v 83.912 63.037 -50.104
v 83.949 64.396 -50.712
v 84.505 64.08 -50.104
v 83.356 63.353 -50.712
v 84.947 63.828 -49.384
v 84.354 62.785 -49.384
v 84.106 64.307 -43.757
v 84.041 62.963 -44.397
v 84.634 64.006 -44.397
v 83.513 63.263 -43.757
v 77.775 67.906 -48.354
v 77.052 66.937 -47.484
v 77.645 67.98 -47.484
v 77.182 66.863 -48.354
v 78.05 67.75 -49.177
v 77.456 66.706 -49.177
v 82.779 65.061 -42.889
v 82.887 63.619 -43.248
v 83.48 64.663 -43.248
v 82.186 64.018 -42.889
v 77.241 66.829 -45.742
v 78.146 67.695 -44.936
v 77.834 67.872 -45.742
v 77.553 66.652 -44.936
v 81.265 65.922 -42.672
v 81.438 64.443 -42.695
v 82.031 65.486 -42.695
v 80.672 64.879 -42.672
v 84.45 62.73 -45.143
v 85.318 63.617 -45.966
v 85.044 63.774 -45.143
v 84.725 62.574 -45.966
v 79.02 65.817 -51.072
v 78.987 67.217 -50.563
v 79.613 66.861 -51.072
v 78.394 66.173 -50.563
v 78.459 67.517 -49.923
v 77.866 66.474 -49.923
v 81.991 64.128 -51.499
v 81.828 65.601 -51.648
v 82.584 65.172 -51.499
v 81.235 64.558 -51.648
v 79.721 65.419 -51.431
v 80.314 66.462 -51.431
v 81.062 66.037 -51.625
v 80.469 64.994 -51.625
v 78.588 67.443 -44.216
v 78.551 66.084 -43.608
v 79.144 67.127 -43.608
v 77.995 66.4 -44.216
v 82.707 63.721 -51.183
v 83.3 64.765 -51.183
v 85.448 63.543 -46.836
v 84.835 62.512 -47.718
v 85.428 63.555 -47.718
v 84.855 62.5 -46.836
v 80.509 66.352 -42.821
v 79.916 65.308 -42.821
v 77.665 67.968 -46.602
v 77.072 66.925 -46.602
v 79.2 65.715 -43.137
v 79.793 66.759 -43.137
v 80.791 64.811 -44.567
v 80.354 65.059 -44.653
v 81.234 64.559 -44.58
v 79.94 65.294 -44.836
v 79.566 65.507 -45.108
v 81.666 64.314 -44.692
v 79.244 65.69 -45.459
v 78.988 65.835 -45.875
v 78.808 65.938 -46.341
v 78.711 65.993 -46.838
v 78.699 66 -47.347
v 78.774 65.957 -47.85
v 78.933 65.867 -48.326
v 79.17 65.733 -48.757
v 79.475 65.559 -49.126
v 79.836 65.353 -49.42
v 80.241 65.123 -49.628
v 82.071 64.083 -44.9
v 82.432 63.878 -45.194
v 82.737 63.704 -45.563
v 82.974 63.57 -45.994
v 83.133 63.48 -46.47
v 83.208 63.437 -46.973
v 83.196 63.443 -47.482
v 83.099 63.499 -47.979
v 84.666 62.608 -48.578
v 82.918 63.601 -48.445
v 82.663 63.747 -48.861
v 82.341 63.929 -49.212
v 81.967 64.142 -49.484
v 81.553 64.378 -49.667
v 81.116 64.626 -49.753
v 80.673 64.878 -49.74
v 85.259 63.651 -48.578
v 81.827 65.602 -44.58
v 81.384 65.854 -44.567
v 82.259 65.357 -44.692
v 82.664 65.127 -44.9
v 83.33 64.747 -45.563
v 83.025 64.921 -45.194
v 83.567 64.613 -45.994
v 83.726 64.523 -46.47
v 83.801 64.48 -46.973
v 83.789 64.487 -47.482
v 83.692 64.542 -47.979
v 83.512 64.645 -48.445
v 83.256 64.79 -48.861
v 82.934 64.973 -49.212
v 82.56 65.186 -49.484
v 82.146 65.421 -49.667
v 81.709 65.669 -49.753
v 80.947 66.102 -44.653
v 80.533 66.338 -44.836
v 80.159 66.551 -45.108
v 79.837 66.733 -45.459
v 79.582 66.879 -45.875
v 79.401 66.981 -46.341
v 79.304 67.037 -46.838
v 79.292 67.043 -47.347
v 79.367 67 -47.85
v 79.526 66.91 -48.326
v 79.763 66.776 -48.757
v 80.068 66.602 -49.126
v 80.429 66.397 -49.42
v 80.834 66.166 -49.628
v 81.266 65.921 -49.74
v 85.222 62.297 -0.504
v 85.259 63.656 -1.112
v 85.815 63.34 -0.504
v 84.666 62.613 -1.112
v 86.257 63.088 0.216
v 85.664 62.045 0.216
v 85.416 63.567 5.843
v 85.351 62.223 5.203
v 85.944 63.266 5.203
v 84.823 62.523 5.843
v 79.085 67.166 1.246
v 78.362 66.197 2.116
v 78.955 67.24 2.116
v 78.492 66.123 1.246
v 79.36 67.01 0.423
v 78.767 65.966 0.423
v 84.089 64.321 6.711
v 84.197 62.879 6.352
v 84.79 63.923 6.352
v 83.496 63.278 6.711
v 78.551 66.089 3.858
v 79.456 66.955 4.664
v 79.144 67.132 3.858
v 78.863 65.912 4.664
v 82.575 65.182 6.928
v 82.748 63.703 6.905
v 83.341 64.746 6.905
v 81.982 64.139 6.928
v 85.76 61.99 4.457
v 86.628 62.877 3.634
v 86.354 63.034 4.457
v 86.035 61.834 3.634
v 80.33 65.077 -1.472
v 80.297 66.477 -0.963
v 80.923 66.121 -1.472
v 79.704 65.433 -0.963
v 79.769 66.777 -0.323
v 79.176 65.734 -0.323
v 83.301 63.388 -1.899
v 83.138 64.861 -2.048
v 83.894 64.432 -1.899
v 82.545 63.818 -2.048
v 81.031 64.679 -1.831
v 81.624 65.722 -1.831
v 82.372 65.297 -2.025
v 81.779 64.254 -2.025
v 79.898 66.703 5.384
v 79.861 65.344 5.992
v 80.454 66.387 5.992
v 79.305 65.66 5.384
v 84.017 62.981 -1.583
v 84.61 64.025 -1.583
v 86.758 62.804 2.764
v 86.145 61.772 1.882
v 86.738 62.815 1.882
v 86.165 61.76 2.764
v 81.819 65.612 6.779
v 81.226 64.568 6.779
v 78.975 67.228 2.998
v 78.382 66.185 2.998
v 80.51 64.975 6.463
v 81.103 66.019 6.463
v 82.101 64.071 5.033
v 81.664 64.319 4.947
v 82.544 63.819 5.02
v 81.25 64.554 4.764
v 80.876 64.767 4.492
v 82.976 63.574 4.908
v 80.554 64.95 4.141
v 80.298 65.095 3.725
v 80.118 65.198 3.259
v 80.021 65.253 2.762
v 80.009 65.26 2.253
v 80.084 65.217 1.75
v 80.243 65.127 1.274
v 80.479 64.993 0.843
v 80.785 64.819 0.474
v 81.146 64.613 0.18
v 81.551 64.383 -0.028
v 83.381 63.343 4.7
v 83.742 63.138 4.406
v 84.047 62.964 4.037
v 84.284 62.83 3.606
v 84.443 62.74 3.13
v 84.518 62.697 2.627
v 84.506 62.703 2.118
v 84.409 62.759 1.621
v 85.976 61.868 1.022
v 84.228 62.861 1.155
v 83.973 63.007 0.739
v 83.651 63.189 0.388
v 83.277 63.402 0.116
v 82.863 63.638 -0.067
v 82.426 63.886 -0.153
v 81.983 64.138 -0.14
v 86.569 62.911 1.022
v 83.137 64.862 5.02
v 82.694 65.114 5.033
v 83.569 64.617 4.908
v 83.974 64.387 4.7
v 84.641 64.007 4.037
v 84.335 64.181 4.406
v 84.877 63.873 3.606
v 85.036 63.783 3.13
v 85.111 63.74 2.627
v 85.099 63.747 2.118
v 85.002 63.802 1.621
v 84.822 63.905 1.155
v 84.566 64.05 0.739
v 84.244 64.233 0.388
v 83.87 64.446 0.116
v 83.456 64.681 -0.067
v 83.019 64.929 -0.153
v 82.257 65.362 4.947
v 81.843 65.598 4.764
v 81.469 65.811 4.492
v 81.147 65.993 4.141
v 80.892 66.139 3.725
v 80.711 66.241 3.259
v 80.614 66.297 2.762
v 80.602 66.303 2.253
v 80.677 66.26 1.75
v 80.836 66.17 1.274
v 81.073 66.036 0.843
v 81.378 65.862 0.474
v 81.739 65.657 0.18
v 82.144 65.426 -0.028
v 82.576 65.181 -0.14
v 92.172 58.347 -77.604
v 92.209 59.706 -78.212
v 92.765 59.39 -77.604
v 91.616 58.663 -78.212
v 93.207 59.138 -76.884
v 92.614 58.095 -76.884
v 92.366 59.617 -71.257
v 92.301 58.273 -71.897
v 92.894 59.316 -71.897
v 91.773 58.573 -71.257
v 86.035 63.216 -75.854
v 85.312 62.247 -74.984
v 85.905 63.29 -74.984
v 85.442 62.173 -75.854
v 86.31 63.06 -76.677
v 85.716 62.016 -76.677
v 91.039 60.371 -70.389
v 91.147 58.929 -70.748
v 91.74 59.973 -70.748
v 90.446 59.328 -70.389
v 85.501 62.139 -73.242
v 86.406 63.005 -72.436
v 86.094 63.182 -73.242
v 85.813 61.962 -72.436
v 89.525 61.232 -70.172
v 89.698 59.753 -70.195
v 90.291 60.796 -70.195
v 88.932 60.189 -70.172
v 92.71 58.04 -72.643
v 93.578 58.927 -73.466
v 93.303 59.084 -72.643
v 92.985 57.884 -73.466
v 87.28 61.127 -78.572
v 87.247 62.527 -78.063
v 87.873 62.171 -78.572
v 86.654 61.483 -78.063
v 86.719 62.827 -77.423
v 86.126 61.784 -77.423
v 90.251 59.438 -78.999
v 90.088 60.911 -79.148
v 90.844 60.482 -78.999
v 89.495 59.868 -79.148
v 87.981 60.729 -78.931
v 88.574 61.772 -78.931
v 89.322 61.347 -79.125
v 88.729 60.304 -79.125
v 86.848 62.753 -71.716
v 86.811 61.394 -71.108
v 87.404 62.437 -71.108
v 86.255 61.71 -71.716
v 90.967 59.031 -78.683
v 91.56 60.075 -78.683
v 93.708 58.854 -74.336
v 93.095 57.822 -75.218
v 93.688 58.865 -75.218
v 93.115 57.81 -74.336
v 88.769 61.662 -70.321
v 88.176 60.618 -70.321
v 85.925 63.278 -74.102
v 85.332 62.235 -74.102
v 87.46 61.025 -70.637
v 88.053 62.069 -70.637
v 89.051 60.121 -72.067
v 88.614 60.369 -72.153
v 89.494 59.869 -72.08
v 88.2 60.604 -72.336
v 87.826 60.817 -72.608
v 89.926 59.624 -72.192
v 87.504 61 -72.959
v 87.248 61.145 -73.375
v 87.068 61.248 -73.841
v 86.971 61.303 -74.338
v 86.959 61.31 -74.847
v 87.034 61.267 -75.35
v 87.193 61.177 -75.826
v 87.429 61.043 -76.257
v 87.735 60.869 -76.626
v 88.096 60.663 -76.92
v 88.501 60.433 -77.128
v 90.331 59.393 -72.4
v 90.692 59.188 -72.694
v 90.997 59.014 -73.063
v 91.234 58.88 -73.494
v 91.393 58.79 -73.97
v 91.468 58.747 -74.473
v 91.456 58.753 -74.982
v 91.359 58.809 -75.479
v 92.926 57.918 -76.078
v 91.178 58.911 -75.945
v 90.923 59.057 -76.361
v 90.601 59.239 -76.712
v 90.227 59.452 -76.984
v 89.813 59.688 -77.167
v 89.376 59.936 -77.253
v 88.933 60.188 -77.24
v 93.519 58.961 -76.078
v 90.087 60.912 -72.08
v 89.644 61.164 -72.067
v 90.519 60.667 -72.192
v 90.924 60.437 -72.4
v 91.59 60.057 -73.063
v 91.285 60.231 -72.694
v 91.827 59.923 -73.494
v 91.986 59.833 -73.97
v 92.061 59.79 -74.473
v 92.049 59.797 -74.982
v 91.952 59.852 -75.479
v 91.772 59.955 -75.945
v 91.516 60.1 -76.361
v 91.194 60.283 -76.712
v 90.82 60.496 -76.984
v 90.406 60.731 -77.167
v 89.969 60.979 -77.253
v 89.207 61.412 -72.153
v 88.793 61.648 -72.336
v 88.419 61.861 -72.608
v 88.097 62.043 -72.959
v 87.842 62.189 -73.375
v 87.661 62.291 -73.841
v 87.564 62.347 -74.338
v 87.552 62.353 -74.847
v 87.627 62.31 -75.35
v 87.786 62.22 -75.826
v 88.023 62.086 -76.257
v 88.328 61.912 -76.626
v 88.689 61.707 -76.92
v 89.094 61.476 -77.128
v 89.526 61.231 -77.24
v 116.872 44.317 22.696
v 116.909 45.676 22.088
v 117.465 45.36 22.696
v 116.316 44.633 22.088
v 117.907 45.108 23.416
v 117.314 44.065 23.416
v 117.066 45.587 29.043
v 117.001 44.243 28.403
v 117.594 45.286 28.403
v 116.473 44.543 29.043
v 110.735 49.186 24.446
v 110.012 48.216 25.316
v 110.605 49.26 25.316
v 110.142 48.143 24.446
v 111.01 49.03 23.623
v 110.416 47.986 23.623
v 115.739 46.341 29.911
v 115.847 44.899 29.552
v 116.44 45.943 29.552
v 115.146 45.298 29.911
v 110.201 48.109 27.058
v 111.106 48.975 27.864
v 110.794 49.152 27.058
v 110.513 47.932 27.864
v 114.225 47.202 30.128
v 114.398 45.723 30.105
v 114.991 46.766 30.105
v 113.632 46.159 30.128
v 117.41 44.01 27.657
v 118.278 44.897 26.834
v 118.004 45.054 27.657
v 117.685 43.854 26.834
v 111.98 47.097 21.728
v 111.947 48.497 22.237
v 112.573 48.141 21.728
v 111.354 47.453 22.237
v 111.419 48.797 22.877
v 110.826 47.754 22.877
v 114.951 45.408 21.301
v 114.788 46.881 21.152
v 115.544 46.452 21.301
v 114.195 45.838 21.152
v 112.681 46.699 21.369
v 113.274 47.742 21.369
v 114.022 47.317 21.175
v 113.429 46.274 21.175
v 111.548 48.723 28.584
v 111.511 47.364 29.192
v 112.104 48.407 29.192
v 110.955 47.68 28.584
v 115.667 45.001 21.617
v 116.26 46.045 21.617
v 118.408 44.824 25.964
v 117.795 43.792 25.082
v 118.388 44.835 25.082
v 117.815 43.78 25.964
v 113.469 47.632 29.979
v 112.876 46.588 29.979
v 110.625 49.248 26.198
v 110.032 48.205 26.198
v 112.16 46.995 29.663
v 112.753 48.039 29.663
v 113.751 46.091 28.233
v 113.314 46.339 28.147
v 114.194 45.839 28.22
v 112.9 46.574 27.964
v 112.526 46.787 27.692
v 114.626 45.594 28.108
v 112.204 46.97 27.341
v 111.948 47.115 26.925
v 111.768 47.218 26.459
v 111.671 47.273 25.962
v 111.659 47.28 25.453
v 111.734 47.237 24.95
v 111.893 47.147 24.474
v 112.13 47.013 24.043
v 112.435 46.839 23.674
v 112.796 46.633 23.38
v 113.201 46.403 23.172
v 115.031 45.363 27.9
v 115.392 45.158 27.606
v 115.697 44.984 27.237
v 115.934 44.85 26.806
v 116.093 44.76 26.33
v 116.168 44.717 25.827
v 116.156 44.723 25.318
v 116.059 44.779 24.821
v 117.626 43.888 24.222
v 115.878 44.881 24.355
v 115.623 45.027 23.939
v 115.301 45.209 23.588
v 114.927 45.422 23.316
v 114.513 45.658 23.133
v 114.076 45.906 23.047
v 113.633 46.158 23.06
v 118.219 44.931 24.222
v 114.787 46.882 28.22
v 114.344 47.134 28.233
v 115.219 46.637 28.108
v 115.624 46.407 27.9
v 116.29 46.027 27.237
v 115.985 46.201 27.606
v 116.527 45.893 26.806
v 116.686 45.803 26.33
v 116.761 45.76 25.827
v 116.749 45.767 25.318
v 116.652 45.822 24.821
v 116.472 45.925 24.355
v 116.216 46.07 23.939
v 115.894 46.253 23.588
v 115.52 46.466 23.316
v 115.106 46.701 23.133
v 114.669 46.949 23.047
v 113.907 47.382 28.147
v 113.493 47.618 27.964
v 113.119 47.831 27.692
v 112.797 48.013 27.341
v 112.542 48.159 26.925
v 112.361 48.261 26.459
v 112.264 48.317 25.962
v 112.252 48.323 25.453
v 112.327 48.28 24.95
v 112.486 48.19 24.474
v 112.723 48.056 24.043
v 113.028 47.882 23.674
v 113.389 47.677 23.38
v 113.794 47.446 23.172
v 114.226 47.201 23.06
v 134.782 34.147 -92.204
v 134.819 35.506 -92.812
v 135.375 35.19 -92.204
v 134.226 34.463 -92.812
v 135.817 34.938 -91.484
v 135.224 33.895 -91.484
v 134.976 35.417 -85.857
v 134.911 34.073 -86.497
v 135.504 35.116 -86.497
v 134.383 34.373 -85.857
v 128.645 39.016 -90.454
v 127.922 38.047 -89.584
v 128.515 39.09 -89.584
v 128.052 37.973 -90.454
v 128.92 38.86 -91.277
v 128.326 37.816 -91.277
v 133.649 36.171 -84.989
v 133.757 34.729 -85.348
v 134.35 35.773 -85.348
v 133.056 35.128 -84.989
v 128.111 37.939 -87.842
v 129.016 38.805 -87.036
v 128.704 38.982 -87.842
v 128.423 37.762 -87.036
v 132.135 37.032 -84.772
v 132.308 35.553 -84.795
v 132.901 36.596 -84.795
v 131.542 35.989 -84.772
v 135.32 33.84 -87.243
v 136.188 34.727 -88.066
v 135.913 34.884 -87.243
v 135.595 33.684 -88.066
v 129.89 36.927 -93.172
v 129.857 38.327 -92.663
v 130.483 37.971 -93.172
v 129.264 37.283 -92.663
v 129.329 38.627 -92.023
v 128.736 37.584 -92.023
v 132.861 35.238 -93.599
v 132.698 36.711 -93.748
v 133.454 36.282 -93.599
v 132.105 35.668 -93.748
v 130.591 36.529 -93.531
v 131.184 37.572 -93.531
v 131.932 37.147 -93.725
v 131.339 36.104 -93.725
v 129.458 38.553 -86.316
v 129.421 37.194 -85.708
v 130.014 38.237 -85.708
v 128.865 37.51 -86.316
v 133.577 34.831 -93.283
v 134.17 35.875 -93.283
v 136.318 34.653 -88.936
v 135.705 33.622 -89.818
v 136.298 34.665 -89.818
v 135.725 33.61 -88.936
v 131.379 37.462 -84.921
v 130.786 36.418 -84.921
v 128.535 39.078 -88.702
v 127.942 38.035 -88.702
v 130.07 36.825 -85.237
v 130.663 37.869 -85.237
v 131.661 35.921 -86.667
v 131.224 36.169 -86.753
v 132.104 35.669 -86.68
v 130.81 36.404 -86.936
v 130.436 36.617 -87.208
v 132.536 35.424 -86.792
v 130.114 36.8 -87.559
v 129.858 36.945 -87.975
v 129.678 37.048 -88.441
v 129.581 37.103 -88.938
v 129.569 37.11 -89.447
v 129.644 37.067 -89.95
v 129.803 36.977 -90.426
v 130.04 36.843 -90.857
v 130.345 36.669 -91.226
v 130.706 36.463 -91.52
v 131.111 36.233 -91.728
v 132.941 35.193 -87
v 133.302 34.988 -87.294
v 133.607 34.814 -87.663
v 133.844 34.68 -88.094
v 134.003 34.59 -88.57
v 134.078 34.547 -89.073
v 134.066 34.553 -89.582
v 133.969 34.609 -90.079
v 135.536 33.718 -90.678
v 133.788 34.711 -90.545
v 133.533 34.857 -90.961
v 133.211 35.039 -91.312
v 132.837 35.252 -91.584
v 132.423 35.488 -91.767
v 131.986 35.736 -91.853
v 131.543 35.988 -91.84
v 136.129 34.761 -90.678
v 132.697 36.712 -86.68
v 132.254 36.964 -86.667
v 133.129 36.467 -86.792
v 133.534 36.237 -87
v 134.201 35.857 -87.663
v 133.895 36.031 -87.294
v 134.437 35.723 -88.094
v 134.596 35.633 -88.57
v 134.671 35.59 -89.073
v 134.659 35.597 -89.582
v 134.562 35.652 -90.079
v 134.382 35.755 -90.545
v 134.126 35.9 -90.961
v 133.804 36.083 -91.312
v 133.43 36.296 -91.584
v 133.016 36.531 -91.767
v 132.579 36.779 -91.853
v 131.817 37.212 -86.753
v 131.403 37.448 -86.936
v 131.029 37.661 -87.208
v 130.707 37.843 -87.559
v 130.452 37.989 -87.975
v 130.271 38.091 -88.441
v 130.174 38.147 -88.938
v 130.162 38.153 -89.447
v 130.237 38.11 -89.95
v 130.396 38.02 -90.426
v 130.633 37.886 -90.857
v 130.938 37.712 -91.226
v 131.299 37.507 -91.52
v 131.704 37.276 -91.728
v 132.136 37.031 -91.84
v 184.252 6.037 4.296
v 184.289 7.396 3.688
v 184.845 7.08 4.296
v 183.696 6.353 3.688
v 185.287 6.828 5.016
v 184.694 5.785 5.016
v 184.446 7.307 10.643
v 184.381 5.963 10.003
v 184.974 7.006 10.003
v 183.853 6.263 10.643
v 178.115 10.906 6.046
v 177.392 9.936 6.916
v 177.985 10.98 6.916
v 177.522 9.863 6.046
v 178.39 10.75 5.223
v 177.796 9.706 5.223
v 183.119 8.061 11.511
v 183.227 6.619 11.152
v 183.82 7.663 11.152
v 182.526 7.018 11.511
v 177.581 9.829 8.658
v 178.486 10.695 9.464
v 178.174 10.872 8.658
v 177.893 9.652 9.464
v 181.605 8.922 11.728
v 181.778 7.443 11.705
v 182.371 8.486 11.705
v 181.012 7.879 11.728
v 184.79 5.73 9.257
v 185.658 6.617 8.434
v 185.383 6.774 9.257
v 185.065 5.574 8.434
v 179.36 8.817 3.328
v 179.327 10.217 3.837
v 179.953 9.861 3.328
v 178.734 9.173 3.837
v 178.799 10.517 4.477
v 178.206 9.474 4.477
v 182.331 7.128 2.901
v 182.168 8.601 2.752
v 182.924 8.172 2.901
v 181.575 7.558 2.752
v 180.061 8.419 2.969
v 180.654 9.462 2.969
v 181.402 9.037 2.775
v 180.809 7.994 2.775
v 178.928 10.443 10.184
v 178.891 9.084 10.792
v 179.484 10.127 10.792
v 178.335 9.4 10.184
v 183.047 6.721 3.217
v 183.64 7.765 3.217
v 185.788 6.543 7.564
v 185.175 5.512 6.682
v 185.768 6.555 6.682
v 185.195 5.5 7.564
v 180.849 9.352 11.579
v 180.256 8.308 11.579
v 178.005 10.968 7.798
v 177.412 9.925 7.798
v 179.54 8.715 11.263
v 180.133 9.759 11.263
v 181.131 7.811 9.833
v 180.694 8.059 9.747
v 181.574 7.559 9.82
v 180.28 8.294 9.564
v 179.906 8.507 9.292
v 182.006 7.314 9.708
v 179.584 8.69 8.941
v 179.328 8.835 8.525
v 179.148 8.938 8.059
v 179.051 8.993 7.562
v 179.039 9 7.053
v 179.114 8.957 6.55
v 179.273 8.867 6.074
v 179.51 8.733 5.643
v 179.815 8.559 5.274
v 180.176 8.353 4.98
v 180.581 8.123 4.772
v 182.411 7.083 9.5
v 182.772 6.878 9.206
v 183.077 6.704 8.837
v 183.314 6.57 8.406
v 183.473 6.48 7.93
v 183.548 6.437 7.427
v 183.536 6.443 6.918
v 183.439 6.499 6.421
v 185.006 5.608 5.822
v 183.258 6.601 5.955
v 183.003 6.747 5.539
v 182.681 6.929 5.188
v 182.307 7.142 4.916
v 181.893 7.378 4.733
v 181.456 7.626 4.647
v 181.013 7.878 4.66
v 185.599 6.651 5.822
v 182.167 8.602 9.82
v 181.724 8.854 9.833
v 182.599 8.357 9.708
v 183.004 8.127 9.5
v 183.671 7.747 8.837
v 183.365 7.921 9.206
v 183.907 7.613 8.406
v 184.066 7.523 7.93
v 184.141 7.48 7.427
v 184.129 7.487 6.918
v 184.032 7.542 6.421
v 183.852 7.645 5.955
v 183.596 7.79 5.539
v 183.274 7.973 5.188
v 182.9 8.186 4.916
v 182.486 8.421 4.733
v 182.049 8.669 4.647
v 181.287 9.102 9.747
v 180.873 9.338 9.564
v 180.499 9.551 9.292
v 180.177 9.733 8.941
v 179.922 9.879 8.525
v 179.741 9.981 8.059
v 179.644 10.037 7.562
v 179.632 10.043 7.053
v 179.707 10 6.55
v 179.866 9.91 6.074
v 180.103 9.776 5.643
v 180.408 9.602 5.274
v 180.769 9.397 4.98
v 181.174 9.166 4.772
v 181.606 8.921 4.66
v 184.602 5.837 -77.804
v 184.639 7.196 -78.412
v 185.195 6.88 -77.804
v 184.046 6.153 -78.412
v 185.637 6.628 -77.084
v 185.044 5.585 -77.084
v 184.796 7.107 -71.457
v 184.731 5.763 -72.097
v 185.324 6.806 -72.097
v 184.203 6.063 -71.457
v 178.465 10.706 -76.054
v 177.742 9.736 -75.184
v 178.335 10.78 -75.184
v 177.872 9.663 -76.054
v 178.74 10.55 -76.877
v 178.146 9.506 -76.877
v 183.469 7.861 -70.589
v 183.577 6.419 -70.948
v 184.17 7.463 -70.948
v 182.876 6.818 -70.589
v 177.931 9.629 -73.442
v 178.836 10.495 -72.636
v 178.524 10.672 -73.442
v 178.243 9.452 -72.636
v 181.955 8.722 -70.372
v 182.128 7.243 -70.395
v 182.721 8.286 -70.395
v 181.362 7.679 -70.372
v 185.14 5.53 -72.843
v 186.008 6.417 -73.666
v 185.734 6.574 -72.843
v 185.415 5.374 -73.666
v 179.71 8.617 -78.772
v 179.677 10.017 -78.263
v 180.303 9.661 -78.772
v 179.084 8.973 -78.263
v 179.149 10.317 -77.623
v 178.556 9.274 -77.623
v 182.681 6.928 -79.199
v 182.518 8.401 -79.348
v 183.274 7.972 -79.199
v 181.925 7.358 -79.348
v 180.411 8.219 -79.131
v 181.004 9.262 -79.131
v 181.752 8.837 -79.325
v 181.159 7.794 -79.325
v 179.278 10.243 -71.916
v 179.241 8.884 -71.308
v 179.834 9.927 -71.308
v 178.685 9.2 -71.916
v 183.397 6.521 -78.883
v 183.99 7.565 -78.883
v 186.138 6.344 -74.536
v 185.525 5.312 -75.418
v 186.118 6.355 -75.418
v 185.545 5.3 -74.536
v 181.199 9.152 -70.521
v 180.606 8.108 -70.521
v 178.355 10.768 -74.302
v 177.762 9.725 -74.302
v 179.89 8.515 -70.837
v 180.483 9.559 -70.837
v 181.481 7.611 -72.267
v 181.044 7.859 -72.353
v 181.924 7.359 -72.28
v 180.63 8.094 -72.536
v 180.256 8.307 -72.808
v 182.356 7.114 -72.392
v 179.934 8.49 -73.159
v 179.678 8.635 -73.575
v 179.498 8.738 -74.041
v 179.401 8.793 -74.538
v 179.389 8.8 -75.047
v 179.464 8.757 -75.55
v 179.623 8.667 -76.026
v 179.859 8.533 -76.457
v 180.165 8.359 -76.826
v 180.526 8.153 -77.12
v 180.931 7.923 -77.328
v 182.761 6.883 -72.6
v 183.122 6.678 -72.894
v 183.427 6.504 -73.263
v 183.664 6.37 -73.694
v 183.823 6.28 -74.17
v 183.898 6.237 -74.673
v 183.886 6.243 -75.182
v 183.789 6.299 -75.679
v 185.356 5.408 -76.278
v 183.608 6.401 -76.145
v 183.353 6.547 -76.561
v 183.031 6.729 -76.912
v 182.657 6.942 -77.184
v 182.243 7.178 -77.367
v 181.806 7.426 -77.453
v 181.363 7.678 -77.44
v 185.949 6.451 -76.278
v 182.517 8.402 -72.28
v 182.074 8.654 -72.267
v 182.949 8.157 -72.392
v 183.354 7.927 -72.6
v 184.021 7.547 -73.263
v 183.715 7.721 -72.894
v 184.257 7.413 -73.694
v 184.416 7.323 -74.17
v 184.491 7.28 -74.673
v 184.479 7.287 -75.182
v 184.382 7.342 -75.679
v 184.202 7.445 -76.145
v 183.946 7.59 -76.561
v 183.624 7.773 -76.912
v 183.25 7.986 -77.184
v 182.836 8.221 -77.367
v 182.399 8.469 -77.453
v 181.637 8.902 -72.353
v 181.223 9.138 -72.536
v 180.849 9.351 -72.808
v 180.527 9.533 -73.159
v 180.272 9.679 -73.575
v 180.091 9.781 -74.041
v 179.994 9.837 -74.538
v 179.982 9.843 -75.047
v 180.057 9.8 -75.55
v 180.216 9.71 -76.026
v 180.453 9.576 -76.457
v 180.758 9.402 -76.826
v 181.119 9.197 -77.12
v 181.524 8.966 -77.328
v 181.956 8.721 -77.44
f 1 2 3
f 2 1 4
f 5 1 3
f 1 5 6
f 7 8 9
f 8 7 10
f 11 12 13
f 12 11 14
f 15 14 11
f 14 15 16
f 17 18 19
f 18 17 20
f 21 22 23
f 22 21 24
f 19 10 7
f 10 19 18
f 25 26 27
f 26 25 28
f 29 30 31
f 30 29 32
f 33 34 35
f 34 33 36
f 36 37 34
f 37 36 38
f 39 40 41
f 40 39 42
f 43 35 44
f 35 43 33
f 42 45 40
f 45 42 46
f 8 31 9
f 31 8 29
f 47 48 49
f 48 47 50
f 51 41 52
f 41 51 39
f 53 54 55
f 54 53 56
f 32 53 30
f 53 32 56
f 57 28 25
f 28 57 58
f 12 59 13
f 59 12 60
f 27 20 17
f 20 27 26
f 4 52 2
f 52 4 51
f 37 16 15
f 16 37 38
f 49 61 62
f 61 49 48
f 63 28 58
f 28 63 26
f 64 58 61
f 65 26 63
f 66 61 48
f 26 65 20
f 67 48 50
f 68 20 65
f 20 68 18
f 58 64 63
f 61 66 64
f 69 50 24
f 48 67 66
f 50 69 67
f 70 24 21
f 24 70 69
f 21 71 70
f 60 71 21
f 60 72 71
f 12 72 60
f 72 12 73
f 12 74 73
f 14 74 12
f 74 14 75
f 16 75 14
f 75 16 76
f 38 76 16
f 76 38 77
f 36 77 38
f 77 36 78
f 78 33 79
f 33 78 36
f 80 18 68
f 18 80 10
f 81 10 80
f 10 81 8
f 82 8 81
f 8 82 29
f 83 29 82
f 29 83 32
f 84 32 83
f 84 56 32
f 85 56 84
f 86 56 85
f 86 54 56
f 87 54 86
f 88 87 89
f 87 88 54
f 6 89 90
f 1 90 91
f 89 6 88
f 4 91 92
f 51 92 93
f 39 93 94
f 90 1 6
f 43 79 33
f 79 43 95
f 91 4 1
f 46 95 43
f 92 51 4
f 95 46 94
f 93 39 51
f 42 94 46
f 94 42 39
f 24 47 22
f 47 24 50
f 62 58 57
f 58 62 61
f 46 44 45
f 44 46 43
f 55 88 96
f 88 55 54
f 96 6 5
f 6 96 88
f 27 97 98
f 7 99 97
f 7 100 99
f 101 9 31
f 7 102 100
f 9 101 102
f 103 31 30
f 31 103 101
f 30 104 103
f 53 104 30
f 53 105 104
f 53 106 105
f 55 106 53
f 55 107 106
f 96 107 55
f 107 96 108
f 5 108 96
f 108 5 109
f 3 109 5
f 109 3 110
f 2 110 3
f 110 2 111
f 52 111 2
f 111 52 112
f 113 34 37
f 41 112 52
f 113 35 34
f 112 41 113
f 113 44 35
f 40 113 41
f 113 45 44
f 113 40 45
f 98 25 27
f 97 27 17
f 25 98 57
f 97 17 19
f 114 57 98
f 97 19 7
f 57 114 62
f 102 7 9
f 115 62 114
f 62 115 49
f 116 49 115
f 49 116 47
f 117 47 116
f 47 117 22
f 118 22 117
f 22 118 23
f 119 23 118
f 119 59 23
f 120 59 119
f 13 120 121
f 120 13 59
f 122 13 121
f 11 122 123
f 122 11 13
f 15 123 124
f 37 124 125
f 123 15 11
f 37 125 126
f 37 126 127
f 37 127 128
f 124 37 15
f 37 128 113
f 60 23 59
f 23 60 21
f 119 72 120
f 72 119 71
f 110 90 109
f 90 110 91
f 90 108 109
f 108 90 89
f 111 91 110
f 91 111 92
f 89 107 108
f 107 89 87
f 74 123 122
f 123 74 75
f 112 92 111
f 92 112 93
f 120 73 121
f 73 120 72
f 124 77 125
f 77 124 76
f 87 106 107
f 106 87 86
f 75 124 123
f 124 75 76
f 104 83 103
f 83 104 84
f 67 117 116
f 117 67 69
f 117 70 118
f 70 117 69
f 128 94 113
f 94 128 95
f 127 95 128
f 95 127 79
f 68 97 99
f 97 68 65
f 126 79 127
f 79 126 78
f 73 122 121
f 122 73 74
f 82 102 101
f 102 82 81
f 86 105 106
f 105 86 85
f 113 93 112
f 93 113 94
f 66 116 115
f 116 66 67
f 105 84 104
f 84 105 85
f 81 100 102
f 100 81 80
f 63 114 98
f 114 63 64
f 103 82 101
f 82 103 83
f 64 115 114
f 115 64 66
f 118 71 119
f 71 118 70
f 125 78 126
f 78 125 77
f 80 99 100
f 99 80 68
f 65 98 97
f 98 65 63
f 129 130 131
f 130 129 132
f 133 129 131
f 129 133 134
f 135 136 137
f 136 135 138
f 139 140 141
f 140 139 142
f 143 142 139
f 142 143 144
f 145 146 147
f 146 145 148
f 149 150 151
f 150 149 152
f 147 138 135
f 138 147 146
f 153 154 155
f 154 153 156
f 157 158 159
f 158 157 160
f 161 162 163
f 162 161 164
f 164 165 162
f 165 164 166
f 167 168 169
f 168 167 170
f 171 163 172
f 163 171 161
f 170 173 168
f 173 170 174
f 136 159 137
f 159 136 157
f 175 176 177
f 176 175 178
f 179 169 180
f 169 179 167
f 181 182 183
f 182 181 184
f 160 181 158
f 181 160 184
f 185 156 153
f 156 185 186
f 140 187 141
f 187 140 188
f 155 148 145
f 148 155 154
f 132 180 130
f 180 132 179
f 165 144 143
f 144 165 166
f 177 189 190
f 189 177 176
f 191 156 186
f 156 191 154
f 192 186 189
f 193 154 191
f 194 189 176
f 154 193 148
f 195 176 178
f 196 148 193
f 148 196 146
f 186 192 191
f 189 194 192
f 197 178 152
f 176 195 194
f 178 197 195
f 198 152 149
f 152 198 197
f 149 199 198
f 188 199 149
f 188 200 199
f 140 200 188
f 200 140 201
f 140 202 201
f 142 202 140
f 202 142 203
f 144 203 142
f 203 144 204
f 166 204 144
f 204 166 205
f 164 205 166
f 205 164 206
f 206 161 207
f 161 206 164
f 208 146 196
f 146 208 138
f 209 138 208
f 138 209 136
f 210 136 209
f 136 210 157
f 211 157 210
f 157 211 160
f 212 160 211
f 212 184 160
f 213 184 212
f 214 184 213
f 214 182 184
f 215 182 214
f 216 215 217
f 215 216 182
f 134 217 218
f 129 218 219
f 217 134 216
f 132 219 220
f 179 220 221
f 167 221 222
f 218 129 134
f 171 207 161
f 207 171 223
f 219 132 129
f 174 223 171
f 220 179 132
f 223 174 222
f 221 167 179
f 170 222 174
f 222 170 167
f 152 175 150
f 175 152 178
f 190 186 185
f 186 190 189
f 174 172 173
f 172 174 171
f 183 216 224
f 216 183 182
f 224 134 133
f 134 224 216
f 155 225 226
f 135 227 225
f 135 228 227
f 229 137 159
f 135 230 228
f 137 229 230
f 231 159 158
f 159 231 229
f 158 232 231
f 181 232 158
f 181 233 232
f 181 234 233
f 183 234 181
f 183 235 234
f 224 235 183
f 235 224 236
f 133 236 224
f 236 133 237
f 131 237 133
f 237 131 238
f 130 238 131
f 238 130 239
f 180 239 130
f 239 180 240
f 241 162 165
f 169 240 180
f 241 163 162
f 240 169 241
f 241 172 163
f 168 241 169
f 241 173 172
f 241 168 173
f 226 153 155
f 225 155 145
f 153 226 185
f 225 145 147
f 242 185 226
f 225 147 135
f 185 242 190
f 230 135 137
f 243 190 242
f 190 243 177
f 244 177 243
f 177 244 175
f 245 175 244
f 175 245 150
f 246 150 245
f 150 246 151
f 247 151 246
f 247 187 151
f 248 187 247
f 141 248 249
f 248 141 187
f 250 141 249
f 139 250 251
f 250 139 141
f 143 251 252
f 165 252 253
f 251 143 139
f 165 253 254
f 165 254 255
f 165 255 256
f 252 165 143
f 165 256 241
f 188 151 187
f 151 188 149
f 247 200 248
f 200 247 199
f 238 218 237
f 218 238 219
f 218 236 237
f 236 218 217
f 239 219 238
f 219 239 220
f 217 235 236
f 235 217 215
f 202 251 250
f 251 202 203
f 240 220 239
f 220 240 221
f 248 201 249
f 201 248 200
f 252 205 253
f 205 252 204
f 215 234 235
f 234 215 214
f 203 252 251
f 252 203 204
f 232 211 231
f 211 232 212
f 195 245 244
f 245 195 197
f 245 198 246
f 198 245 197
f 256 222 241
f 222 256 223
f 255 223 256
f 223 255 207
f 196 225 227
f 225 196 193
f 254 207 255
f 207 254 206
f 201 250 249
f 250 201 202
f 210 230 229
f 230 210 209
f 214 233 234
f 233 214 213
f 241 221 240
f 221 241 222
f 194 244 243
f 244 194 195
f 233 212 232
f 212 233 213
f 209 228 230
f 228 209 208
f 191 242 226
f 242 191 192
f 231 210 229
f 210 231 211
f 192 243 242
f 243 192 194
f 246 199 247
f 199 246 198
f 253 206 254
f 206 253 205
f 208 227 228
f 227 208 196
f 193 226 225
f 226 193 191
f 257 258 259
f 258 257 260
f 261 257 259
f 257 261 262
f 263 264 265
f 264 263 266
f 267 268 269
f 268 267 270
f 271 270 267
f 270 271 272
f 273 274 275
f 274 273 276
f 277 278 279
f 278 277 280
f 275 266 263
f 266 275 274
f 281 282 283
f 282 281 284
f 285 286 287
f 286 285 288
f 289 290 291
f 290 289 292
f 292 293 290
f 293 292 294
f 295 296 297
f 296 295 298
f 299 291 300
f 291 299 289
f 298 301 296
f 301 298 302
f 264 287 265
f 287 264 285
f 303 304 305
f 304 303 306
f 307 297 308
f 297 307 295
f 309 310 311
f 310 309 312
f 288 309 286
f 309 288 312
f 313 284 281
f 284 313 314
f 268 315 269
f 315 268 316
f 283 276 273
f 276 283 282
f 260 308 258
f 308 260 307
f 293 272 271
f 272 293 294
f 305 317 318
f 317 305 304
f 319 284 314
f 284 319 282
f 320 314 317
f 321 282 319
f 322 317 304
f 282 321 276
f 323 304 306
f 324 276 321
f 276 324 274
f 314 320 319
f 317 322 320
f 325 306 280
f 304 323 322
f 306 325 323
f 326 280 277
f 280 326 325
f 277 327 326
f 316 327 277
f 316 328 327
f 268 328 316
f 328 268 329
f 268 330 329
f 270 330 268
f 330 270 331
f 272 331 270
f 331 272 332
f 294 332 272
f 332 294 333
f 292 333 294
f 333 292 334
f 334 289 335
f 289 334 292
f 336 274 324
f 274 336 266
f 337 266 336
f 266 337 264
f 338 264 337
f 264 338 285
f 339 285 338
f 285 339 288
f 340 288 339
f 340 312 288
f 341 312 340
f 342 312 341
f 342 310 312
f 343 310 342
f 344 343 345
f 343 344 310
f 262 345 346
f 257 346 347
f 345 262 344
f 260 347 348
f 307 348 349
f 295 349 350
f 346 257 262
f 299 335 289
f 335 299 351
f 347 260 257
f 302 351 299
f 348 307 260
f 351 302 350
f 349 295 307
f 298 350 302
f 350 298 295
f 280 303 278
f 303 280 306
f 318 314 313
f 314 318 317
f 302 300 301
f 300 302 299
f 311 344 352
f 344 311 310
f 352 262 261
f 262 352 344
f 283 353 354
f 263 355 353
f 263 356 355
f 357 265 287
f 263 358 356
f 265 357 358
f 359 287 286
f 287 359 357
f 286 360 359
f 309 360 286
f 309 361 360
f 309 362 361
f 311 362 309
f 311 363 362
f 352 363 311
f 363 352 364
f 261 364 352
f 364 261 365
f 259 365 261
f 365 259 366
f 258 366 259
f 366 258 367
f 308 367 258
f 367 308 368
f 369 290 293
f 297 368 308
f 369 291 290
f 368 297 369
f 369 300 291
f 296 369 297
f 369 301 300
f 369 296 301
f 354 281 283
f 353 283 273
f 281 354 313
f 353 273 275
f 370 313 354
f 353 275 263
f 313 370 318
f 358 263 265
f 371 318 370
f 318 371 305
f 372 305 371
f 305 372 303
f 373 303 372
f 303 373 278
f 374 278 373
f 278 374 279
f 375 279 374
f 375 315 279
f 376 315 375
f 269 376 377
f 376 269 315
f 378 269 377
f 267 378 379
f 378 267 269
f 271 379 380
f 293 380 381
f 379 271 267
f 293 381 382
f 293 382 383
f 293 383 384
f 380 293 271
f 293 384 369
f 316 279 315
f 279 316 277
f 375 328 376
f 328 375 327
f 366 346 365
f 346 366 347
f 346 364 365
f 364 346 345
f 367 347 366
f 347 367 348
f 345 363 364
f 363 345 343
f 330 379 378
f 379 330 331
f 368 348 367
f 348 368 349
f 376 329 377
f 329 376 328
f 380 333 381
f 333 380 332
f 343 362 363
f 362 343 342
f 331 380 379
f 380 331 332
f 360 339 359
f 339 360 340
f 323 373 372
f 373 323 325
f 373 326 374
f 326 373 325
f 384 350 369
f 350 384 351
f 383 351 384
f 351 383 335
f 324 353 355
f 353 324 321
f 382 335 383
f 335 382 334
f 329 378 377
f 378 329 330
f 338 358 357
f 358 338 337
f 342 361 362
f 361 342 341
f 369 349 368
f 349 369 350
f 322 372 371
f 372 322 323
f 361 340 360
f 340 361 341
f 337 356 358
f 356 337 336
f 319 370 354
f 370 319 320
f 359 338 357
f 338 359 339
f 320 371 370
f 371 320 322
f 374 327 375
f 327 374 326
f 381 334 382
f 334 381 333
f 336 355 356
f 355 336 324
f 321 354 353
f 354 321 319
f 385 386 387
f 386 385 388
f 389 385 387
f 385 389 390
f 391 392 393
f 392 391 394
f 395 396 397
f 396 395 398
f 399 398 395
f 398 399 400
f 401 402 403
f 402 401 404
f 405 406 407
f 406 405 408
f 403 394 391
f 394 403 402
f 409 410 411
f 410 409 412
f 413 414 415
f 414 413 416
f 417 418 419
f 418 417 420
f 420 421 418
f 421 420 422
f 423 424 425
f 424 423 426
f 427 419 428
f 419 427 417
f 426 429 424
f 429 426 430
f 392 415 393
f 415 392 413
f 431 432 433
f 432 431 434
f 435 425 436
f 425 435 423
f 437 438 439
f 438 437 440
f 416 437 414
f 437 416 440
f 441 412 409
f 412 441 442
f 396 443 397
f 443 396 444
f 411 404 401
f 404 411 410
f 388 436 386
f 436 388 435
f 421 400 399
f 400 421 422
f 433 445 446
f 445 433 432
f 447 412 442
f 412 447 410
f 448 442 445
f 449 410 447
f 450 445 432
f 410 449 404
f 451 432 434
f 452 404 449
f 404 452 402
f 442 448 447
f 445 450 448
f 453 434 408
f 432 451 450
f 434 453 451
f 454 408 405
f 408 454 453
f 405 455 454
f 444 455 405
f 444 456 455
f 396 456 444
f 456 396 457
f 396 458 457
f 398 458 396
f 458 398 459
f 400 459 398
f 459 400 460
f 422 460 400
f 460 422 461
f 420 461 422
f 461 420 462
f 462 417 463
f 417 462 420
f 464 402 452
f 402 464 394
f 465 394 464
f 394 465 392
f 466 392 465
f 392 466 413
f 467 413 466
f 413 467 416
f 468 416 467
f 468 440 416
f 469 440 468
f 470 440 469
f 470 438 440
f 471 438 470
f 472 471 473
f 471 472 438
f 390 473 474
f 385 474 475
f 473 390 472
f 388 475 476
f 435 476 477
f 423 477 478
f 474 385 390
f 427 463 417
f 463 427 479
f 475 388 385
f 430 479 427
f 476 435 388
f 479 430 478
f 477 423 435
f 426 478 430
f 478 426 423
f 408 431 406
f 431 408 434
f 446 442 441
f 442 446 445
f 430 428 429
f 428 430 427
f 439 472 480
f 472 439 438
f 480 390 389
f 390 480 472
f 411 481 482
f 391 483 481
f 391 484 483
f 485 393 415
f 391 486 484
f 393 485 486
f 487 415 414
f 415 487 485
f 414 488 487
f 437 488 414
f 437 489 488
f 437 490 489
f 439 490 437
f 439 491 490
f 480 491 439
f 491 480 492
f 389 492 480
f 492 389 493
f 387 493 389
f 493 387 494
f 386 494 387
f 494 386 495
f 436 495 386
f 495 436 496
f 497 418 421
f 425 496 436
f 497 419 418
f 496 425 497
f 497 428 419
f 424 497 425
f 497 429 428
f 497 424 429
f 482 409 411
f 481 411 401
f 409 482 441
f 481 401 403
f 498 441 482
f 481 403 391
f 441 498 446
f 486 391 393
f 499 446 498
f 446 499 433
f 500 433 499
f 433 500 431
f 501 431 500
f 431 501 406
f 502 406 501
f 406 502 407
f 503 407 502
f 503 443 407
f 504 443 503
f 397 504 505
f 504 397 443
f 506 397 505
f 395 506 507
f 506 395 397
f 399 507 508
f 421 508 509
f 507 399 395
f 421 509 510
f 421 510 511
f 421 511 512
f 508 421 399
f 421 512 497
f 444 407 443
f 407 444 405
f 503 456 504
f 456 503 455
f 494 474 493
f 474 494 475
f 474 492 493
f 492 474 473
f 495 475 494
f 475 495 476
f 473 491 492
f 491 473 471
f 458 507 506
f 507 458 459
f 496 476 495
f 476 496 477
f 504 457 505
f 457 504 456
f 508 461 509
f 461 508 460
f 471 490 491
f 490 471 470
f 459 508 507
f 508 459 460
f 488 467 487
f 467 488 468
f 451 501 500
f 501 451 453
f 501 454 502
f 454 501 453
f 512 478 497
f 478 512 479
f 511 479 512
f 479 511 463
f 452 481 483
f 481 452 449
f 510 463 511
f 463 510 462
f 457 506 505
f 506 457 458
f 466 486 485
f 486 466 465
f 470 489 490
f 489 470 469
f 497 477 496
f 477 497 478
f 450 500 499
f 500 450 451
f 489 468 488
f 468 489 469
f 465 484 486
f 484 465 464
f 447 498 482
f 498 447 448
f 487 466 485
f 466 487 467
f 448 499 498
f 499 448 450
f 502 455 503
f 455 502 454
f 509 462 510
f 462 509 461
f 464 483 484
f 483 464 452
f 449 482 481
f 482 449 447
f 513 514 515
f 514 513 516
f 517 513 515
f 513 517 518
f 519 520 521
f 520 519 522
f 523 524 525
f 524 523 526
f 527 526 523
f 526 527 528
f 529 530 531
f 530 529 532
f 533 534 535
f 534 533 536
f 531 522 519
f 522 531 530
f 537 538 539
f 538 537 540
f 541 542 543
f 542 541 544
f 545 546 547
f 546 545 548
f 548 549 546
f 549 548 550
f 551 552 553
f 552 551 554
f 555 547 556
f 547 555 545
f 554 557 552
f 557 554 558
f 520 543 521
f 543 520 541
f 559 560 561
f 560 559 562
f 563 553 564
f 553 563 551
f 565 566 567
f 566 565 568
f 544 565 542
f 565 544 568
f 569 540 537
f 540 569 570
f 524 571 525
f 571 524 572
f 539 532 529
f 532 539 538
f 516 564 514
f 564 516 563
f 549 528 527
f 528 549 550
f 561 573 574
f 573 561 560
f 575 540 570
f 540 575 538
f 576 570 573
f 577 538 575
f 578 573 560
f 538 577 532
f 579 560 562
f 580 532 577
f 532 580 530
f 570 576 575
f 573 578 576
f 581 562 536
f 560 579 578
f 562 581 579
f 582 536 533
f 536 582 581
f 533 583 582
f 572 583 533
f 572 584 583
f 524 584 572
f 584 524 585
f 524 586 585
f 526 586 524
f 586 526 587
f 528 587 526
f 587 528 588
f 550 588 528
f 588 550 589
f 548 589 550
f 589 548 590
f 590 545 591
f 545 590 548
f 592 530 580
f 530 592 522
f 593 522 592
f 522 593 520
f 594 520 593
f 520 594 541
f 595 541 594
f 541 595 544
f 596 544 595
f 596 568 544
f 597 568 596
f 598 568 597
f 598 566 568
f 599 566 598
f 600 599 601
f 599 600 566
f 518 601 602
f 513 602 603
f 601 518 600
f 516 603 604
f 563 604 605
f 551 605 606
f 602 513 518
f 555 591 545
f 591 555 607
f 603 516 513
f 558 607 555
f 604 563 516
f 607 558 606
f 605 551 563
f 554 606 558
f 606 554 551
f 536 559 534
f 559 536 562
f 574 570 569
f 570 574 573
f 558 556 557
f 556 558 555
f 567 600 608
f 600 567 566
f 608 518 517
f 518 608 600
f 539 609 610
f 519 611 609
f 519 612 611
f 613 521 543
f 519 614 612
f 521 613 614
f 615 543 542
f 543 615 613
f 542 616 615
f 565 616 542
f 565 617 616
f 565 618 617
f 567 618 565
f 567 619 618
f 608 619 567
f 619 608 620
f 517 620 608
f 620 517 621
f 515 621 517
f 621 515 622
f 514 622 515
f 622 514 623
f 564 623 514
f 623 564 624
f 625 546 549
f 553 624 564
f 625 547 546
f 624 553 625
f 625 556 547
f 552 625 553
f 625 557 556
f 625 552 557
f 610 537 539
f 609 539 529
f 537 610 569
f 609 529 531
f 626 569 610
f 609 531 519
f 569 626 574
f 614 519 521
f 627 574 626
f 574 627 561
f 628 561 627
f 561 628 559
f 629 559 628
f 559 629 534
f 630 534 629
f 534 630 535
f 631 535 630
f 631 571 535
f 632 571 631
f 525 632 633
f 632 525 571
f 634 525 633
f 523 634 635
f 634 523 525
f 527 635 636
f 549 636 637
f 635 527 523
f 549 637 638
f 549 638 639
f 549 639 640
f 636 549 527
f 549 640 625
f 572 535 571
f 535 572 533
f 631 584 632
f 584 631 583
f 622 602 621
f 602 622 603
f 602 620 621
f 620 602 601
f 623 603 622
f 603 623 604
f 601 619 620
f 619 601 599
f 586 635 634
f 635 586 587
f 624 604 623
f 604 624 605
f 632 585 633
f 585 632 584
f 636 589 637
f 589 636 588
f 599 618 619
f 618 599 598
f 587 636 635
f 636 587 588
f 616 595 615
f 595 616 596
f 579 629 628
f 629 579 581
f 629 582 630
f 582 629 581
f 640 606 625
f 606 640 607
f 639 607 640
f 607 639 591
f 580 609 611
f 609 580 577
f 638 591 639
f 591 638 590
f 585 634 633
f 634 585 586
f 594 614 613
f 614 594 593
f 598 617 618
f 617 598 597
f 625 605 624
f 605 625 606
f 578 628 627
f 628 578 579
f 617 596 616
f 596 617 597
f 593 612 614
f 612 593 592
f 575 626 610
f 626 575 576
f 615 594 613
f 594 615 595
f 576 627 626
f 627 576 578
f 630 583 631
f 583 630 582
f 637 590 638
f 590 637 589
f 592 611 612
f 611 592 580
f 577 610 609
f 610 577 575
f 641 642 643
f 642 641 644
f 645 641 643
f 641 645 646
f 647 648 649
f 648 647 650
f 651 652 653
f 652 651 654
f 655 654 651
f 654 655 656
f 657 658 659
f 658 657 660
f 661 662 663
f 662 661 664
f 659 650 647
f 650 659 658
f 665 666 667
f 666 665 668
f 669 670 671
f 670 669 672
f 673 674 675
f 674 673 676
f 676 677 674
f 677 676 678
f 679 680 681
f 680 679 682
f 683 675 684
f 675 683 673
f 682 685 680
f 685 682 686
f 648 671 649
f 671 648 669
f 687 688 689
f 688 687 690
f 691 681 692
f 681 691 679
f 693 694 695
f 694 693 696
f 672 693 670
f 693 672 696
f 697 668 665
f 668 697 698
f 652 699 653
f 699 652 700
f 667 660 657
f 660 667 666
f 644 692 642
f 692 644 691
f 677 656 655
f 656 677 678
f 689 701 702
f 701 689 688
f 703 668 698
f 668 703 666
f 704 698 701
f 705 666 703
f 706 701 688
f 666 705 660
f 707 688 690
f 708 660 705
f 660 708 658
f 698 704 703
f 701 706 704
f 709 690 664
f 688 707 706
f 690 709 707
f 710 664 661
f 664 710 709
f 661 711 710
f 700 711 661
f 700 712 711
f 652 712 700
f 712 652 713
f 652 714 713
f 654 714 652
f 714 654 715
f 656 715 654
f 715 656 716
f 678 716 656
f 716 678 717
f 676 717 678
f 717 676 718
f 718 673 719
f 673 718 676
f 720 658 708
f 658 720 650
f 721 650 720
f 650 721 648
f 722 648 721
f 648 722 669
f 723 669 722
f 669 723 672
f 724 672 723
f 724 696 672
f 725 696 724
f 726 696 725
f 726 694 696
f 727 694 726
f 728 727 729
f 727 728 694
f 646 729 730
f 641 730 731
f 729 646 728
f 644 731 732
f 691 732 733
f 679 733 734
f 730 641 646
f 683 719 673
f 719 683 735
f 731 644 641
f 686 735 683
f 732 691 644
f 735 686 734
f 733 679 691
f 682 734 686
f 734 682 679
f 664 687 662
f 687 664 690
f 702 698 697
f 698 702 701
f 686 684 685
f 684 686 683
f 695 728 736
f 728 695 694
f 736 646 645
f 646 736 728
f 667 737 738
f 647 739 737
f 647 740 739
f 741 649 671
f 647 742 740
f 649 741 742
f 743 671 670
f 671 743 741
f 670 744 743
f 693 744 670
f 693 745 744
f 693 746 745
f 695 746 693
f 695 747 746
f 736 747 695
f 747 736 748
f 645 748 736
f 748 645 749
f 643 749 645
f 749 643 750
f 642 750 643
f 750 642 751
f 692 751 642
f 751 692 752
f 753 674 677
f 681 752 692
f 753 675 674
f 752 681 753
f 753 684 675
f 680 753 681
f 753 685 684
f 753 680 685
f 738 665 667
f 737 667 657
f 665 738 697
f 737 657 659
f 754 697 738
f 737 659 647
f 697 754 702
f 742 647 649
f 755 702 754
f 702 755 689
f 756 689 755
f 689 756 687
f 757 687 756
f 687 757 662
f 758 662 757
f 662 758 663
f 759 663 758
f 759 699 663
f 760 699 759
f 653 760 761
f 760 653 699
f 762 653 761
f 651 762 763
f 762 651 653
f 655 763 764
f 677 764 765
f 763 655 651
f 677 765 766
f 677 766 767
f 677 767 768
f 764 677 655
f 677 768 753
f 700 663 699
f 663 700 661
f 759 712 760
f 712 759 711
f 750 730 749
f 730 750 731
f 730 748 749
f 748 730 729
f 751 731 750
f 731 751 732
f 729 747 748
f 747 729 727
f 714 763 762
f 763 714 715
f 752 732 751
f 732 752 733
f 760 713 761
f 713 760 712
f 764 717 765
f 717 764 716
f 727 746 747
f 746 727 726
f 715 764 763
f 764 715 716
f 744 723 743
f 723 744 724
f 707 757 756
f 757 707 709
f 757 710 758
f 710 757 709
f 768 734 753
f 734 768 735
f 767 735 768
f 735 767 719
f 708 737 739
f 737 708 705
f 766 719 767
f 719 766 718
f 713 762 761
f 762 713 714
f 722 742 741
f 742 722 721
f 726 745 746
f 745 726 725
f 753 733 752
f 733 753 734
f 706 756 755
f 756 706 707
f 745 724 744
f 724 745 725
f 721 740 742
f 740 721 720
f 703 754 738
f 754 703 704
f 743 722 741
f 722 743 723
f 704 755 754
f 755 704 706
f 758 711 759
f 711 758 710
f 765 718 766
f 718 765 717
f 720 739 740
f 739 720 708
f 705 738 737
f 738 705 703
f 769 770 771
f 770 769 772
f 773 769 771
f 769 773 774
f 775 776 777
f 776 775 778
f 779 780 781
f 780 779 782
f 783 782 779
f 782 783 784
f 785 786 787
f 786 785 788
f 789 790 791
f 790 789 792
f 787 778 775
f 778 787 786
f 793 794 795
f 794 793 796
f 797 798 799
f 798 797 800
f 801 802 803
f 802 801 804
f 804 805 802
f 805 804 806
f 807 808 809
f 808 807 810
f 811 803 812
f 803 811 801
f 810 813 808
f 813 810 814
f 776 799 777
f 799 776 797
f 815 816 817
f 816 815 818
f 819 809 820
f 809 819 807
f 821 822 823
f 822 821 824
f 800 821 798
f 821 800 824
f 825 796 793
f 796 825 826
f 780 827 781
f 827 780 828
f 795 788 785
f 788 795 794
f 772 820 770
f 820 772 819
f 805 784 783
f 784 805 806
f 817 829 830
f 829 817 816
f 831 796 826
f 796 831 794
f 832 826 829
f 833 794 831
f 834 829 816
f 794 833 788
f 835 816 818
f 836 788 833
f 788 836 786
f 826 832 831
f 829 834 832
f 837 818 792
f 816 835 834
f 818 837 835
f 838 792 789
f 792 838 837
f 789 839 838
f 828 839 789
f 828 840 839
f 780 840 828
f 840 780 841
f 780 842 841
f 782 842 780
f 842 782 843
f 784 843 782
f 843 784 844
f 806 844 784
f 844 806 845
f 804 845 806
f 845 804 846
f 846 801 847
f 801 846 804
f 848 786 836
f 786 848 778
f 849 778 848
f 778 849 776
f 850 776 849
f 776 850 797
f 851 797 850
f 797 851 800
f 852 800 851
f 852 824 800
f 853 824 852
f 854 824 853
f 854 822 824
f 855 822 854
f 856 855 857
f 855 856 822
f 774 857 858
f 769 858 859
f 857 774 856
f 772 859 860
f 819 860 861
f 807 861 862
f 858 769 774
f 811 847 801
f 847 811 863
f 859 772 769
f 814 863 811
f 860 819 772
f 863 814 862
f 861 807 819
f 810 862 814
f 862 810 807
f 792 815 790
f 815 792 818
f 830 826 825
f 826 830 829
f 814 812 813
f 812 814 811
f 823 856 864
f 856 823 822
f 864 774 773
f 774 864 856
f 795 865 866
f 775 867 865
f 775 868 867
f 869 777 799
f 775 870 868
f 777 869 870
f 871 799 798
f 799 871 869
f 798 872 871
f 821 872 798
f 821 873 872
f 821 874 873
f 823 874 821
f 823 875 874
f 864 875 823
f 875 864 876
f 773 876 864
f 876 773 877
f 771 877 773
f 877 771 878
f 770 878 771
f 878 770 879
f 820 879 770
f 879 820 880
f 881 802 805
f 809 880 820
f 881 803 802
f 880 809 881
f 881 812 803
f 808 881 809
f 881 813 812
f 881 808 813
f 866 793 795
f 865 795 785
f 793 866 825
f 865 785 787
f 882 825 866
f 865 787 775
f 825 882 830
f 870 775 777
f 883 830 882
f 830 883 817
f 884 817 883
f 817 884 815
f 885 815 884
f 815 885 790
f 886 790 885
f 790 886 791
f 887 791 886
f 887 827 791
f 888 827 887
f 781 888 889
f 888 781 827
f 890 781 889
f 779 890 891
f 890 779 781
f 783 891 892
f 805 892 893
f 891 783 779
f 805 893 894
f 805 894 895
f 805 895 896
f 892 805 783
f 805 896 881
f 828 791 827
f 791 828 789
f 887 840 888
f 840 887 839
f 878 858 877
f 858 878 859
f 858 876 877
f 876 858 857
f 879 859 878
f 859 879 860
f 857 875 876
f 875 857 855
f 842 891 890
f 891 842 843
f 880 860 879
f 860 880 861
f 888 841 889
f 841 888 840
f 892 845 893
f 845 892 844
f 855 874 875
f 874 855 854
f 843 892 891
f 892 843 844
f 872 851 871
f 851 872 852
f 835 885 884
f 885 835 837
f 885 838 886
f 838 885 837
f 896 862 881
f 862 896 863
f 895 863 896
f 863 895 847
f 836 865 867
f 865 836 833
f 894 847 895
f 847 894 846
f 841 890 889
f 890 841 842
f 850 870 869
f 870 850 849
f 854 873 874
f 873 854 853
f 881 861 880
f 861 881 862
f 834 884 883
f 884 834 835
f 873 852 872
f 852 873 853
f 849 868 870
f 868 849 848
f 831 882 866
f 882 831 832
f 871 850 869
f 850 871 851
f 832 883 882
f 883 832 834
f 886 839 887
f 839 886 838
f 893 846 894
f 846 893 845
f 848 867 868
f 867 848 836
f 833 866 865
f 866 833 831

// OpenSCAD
pts=[[81.25,65.24,-47.16],[82.56,64.5,2.44],[89.51,60.55,-74.66],[114.21,46.52,25.64],[132.12,36.35,-89.26],[181.59,8.24,7.24],[181.94,8.04,-74.86]];
module ring() rotate(a=90,v=[-0.869,0.494,0]) difference(){ cylinder(d=9,h=1.2,center=true,$fn=32); cylinder(d=5.2,h=3,center=true,$fn=32); }
for(p=pts) translate(p) ring();
